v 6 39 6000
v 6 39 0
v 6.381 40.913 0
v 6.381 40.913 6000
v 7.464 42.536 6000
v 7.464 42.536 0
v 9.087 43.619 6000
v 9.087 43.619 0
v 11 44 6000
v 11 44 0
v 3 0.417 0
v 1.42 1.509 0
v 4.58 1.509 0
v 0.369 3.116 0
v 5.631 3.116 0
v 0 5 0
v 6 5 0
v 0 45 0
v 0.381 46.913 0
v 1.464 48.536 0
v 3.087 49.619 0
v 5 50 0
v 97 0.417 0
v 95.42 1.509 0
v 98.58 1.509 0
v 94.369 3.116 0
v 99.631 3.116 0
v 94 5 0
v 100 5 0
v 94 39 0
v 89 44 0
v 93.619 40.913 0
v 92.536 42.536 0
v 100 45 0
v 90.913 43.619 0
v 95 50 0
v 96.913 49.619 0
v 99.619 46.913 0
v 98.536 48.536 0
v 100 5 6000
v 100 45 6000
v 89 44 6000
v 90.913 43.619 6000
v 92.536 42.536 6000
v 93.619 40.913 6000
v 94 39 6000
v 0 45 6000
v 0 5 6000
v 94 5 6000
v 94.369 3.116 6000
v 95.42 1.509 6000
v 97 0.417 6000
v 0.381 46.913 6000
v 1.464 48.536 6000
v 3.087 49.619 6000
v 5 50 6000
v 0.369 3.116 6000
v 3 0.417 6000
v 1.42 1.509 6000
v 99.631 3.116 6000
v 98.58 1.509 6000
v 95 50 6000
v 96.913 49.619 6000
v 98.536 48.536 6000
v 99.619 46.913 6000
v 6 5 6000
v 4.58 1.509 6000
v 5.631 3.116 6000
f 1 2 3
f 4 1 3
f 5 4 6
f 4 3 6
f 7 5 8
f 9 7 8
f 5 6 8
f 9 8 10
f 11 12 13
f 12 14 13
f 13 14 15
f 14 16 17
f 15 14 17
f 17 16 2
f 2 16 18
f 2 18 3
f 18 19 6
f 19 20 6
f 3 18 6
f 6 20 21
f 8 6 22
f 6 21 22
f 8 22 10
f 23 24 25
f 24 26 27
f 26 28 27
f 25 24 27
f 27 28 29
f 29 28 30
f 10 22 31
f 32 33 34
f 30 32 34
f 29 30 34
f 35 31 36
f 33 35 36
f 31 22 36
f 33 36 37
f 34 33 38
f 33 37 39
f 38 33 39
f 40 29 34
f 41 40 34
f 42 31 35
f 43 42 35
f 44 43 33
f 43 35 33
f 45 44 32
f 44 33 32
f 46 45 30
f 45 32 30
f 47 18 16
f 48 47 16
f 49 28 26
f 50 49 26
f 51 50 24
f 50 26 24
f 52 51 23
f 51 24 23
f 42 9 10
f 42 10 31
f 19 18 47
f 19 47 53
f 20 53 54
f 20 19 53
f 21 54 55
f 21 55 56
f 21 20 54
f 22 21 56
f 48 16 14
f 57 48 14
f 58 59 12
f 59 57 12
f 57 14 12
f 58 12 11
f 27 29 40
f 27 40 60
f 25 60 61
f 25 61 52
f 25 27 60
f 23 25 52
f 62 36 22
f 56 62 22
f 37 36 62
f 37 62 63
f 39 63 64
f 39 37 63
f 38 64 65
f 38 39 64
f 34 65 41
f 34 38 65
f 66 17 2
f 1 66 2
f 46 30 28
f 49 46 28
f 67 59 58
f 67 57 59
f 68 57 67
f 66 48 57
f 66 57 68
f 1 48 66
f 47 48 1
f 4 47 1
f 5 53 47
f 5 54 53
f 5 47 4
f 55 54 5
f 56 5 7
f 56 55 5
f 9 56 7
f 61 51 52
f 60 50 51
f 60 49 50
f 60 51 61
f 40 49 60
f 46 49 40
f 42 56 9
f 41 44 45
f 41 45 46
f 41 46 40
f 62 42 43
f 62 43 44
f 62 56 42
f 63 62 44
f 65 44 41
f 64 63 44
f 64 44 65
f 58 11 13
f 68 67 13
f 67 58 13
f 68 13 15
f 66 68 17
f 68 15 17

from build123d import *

# Parameters (mm, degrees)
F1_DEPTH    = 6000
F2_T1_DEPTH = 6000
F2_T3_DEPTH = 6025


# Not quite as in the source:
# - a fillet or chamfer that OpenCascade refuses, or shapes differently, is made with other operations: its cross-section is extruded or revolved along the edge and cut away or added


with BuildPart() as f1:
    # F0 (on Top) → F1 (new body)
    with BuildSketch(Plane.XY):
        Polygon((0, 50), (0, 0), (6, 0), (6, 44), (94, 44), (94, 0), (100, 0), (100, 50), align=None)
    extrude(amount=F1_DEPTH)

    # F2: fillet of radius 5 on 8 edges, made by hand

    # F2_s2 → F2_t1 (join)
    with BuildSketch(Plane.XY):
        with BuildLine():
            ThreePointArc((6, 39), (7.4644660941, 42.5355339059), (11, 44))
            Line((11, 44), (6, 44))
            Line((6, 44), (6, 39))
        make_face()
        with BuildLine():
            ThreePointArc((89, 44), (92.5355339059, 42.5355339059), (94, 39))
            Line((94, 39), (94, 44))
            Line((94, 44), (89, 44))
        make_face()
    extrude(amount=F2_T1_DEPTH)

    # F2_s4 → F2_t3 (cut)
    with BuildSketch(Plane.XY.offset(-12.5)):
        with BuildLine():
            ThreePointArc((1, 0), (4.5355339059, 1.4644660941), (6, 5))
            Line((6, 5), (6, 0))
            Line((6, 0), (1, 0))
        make_face()
        with BuildLine():
            ThreePointArc((0, 5), (1.4644660941, 1.4644660941), (5, 0))
            Line((5, 0), (0, 0))
            Line((0, 0), (0, 5))
        make_face()
        with BuildLine():
            ThreePointArc((100, 5), (98.5355339059, 1.4644660941), (95, 0))
            Line((95, 0), (100, 0))
            Line((100, 0), (100, 5))
        make_face()
        with BuildLine():
            ThreePointArc((94, 5), (95.4644660941, 1.4644660941), (99, 0))
            Line((99, 0), (94, 0))
            Line((94, 0), (94, 5))
        make_face()
        with BuildLine():
            ThreePointArc((0, 45), (1.4644660941, 48.5355339059), (5, 50))
            Line((5, 50), (0, 50))
            Line((0, 50), (0, 45))
        make_face()
        with BuildLine():
            ThreePointArc((95, 50), (98.5355339059, 48.5355339059), (100, 45))
            Line((100, 45), (100, 50))
            Line((100, 50), (95, 50))
        make_face()
    extrude(amount=F2_T3_DEPTH, mode=Mode.SUBTRACT)


solid = f1.part
